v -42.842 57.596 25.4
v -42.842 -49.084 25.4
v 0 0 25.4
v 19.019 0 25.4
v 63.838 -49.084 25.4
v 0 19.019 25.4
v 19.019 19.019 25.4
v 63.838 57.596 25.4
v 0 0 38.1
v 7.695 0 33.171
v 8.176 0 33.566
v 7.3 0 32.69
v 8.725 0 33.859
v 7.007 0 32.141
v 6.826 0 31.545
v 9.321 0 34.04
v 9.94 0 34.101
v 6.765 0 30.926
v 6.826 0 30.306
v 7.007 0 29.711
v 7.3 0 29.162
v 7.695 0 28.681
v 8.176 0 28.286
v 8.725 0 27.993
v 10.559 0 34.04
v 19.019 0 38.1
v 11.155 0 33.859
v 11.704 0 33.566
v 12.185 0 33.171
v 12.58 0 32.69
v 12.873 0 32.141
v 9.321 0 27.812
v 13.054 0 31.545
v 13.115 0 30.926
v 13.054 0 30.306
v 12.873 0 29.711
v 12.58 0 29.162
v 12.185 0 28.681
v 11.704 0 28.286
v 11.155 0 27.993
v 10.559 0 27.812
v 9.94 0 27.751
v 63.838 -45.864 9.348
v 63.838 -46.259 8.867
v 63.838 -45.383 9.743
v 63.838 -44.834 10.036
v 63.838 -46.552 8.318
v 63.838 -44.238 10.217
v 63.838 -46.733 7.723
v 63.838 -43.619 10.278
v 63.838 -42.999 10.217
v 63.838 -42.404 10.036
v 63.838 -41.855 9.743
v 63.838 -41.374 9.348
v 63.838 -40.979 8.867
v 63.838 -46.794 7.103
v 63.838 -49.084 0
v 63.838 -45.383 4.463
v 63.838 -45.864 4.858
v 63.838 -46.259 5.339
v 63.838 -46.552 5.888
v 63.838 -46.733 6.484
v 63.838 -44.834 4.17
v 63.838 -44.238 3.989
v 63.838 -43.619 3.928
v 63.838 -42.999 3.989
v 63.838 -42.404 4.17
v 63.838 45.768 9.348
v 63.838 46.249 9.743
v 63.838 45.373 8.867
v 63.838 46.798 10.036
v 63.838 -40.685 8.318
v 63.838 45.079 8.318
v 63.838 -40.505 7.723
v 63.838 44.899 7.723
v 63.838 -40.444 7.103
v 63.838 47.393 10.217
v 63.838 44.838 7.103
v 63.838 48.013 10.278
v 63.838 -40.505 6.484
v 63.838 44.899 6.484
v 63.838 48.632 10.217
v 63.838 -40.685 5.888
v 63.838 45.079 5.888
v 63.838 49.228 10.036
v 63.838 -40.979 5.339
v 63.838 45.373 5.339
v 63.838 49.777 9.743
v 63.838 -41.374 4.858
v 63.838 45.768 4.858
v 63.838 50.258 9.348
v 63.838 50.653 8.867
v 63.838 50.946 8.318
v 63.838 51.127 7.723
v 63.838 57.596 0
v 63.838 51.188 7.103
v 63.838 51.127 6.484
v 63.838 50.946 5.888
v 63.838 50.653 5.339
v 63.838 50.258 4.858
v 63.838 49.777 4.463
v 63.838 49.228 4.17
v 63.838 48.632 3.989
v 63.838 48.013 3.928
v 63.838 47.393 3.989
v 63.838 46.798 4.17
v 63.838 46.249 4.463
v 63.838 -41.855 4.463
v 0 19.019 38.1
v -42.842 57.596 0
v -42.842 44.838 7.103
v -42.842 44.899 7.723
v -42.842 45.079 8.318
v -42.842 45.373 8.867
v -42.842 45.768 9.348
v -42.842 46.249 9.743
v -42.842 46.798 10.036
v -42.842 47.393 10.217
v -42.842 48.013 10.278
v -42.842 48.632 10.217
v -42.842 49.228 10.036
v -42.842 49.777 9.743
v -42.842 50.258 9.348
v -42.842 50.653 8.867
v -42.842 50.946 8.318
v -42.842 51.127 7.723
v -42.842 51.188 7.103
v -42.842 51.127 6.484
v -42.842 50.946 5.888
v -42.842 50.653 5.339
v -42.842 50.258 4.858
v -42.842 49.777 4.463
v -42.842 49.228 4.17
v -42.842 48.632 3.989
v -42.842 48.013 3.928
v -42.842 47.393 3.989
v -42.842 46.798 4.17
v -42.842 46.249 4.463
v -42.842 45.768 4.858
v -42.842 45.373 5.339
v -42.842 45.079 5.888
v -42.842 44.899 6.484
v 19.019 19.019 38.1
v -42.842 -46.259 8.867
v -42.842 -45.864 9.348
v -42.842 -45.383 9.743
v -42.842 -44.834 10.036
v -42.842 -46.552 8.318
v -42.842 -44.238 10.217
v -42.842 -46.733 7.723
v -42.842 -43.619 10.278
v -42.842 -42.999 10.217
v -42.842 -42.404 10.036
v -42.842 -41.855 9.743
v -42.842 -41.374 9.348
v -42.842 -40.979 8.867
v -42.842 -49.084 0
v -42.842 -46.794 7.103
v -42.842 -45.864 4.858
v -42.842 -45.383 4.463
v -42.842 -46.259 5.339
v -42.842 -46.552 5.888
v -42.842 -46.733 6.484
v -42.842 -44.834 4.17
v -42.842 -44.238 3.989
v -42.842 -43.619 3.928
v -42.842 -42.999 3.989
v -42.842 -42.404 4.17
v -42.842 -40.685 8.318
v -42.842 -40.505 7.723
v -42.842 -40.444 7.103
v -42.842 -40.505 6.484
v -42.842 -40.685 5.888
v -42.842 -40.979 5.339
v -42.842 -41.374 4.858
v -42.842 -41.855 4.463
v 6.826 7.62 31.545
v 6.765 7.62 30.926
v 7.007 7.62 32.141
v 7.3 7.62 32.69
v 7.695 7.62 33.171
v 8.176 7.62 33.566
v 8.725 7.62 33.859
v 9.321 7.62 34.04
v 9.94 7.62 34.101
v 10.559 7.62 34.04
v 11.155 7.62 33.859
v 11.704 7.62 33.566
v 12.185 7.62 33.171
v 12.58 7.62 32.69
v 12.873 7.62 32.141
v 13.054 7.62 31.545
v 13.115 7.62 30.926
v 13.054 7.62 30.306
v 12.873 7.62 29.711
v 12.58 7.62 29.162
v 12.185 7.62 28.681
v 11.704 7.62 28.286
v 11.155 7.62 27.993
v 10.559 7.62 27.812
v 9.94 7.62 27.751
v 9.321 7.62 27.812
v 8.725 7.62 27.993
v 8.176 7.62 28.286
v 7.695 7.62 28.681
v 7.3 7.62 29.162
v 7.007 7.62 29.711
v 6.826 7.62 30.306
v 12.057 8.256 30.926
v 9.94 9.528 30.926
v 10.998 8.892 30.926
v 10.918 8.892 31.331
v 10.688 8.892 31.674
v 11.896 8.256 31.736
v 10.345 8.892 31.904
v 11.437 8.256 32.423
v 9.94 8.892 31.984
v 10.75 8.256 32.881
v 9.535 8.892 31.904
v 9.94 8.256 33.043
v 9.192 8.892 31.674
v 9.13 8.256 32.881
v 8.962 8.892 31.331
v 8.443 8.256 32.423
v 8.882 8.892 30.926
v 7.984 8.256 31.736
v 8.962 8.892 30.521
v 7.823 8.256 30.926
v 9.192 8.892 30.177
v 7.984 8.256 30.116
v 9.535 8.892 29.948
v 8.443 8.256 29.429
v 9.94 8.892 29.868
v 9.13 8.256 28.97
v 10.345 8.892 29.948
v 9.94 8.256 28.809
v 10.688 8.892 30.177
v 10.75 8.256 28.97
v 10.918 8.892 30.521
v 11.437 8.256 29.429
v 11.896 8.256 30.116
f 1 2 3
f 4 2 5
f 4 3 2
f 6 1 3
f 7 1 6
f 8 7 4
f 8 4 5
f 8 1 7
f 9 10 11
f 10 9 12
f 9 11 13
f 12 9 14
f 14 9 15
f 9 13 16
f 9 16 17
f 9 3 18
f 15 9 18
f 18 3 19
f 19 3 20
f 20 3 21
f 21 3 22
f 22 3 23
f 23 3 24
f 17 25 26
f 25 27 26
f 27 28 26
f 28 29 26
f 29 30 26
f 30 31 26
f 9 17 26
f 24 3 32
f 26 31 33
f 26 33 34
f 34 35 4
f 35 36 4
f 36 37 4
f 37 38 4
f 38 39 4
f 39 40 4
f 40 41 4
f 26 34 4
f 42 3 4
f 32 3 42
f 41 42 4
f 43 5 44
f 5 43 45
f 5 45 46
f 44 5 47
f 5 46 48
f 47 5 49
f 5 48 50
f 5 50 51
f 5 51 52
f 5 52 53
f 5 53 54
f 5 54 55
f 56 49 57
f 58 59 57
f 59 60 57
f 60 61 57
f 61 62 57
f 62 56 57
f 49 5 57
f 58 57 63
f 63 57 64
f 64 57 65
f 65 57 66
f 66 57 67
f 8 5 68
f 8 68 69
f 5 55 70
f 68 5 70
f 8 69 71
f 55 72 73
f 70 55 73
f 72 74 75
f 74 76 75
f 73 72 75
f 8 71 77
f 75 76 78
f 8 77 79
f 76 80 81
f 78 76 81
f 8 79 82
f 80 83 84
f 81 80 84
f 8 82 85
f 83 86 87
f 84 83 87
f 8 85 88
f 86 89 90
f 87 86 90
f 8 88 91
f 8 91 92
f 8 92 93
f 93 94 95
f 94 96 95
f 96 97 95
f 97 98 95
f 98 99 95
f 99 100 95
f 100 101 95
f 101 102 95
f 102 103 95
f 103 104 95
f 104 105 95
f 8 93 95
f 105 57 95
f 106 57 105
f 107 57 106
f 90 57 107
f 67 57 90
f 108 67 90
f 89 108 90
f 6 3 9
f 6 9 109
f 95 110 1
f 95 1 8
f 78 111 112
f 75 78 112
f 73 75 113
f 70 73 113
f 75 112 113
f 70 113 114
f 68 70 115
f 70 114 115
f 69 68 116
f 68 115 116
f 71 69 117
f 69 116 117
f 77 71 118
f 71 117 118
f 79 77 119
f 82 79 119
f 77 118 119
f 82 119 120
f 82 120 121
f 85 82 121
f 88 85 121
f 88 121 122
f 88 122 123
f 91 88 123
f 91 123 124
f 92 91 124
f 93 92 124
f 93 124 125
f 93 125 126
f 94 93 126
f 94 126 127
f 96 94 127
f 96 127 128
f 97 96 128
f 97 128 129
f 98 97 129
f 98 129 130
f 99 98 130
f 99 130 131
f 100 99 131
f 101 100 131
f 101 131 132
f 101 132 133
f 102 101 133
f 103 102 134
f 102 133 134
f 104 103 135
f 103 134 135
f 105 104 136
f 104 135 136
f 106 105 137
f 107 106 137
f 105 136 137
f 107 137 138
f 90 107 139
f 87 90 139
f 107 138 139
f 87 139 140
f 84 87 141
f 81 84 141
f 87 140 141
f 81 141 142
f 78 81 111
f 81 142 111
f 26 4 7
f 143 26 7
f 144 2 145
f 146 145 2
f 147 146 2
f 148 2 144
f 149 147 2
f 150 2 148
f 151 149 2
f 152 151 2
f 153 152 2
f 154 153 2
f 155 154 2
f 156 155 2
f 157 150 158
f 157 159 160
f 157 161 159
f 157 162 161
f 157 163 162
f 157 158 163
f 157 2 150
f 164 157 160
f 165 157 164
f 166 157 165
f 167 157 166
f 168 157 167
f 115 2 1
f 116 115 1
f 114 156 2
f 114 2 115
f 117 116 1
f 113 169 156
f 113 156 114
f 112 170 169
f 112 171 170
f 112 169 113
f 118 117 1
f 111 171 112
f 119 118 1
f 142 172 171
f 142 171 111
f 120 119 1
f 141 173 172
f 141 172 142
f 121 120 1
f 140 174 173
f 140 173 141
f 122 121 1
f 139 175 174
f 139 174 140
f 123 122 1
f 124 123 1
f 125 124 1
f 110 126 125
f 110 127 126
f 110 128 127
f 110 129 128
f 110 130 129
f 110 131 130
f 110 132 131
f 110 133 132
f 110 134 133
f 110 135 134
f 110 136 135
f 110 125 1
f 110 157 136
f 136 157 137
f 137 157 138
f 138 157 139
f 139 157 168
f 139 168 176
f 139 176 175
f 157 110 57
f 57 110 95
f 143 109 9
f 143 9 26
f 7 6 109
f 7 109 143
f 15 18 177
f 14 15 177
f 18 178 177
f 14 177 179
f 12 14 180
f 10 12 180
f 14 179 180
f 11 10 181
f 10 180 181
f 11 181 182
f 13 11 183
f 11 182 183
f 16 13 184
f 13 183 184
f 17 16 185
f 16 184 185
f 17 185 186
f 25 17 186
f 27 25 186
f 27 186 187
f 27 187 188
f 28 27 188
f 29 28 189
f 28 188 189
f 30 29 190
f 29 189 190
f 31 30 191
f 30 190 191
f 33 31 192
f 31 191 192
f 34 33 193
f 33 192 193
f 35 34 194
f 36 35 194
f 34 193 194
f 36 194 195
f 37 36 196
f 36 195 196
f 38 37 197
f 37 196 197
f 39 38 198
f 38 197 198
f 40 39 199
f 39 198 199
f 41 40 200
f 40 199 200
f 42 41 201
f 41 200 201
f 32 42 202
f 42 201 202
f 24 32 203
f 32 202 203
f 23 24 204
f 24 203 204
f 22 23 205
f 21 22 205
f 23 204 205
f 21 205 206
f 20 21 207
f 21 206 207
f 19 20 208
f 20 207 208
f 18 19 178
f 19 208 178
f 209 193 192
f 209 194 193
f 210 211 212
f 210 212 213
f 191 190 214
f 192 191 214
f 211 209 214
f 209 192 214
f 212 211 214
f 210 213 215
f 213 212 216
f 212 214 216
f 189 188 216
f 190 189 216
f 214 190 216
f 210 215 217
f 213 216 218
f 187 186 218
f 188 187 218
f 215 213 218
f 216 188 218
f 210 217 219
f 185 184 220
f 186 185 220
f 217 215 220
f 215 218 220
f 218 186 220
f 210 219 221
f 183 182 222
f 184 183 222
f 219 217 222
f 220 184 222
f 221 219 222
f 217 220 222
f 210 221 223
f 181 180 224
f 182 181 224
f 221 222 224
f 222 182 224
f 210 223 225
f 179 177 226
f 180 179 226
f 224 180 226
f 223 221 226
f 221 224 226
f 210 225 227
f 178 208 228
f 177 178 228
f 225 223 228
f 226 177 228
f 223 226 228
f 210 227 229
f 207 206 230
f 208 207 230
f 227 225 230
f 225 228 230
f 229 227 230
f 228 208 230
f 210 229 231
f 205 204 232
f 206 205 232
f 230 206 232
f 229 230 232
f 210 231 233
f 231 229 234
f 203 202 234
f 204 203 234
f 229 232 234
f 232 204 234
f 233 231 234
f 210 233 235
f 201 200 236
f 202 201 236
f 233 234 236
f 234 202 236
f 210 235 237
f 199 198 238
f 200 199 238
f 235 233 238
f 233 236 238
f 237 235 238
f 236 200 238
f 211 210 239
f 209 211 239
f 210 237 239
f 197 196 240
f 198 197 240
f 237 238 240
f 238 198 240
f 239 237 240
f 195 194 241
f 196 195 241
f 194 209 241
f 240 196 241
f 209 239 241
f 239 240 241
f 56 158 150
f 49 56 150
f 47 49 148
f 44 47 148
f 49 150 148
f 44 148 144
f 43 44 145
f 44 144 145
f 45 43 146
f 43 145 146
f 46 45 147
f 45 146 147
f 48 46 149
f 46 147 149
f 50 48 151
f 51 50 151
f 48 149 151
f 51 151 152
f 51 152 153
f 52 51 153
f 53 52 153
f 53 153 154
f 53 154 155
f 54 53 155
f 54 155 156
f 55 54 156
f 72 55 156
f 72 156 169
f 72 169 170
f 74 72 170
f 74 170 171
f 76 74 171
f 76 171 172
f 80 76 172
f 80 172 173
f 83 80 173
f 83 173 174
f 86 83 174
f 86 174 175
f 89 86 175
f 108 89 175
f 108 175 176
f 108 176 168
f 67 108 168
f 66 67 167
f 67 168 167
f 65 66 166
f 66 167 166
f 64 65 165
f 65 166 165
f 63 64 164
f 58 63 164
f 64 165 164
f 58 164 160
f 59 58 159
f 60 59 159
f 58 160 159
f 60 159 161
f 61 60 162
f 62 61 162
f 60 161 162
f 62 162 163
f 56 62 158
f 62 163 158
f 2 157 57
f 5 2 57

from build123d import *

# Parameters (mm, degrees)
F0_W     = 106.6800057888
F0_H     = 106.6800057888
F1_DEPTH = 25.4
F3_D     = 6.35
F4_W     = 19.0191436559
F4_H     = 19.0191436559
F5_DEPTH = 12.7
F7_D     = 6.35
F7_DEPTH = 7.62
F7_TIP   = 1.9077324654


with BuildPart() as f1:
    # F0 (on Top) → F1 (new body)
    with BuildSketch(Plane.XY):
        with Locations((10.4977674782, 4.2558498681)):
            Rectangle(F0_W, F0_H)
    extrude(amount=F1_DEPTH)

    # F3 (through all)
    with Locations(Plane.YZ.offset(63.8377703726)):
        with Locations((-43.6188168824, 7.1031823754), (48.0126738548, 7.1031823754)):
            Hole(F3_D / 2)

    # F4 (on face) → F5 (join)
    with BuildSketch(Plane.XY.offset(25.4)):
        with Locations((9.5095718279, 9.5095718279)):
            Rectangle(F4_W, F4_H)
    extrude(amount=F5_DEPTH)

    # F7
    with Locations(Plane.XZ):
        with Locations((9.9399928004, 30.9258513153)):
            Hole(F7_D / 2, depth=F7_DEPTH)
            with Locations((0, 0, -(F7_DEPTH + F7_TIP / 2))):  # 118° drill point
                Cone(0, F7_D / 2, F7_TIP, mode=Mode.SUBTRACT)


solid = f1.part
